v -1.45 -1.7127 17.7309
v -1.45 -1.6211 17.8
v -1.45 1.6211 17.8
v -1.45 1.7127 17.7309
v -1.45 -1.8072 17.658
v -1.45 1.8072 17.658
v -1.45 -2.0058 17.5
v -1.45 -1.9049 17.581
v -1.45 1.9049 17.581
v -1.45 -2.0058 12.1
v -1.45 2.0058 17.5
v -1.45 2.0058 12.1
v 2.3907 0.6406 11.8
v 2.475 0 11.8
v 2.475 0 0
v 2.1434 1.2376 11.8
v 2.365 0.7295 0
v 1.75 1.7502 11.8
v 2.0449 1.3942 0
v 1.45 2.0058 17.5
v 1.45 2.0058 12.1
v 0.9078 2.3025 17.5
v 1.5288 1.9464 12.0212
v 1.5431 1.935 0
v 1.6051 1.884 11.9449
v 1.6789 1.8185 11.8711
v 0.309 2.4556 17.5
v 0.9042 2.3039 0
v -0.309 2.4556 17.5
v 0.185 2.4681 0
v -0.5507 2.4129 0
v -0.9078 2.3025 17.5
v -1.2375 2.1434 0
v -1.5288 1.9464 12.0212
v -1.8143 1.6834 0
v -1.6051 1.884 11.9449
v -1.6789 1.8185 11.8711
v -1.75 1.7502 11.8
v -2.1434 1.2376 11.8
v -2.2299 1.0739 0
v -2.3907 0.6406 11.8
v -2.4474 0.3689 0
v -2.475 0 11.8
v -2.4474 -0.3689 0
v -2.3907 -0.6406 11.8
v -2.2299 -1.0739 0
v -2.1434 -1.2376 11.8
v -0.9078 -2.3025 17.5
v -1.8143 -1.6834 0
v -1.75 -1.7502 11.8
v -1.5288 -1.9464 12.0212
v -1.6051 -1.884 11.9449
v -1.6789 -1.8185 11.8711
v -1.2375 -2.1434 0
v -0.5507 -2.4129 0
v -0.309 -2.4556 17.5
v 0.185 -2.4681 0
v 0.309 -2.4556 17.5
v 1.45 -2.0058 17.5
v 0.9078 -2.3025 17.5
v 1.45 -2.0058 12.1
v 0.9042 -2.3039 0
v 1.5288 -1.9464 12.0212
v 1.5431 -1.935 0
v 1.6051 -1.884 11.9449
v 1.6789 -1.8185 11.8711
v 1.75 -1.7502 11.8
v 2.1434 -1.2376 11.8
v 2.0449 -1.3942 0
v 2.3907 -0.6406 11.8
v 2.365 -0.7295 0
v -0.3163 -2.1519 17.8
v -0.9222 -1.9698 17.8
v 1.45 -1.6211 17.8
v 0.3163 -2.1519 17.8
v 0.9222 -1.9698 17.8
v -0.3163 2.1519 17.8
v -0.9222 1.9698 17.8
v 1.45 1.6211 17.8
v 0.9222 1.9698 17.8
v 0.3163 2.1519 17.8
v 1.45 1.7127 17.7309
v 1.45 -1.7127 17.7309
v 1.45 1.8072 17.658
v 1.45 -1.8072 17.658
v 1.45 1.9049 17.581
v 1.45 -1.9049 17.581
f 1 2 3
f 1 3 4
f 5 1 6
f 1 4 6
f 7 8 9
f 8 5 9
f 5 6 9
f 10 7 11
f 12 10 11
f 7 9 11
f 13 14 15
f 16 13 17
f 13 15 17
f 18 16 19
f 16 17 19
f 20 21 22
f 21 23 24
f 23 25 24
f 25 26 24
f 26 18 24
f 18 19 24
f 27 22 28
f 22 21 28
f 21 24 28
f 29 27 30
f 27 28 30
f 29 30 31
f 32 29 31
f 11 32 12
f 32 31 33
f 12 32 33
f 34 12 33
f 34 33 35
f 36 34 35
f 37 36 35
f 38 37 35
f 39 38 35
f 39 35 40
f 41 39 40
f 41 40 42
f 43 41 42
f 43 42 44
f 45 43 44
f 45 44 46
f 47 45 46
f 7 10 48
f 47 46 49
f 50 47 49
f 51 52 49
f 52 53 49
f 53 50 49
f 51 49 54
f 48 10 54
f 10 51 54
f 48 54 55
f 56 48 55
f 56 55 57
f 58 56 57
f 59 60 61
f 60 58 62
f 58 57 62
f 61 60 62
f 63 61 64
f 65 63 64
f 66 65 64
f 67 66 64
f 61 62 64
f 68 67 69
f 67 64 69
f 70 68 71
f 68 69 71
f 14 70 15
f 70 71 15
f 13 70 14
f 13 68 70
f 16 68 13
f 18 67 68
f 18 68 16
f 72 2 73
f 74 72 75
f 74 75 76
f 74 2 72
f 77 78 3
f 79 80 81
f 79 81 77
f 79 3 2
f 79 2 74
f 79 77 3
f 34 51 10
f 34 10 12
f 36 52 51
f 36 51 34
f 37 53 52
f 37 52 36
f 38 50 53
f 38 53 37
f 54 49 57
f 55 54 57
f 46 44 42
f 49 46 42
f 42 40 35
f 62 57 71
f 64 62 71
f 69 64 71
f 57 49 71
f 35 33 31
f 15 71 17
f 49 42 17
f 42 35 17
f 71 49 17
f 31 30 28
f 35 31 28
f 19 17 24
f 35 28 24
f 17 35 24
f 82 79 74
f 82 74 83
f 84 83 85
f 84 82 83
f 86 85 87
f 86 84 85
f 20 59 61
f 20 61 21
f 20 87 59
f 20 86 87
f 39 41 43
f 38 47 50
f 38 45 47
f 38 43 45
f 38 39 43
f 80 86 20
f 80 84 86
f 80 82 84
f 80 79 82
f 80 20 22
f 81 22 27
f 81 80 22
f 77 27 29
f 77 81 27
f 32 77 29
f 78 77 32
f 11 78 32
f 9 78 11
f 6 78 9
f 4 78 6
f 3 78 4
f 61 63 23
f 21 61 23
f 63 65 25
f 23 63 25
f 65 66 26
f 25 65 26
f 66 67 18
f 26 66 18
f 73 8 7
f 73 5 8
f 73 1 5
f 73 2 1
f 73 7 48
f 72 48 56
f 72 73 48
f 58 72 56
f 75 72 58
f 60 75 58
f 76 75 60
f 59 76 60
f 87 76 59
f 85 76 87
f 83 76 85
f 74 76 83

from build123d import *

# Parameters (mm, degrees)
SKETCH1_R           = 2.475
EXTRUDE1_DEPTH      = 17.8
SKETCH2_OUTSIDE_W   = 10.776
SKETCH2_OUTSIDE_H   = 10.776
SKETCH2_OUTSIDE_W_2 = 2.9
SKETCH2_OUTSIDE_H_2 = 7
EXTRUDE2_DEPTH      = 6
CHAMFER1_SIZE       = 0.3
CHAMFER2_SIZE       = 0.3


with BuildPart() as part:
    # Sketch1 → Extrude1 (new body)
    with BuildSketch(Plane.XY):
        Circle(SKETCH1_R)
    extrude(amount=EXTRUDE1_DEPTH)

    # Sketch2 outside → Extrude2 (cut)
    with BuildSketch(Plane.XY.offset(17.8)):
        Rectangle(SKETCH2_OUTSIDE_W, SKETCH2_OUTSIDE_H)
        Rectangle(SKETCH2_OUTSIDE_W_2, SKETCH2_OUTSIDE_H_2, mode=Mode.SUBTRACT)
    extrude(amount=-EXTRUDE2_DEPTH, mode=Mode.SUBTRACT)

    # Chamfer1
    chamfer1_edges = [part.edges().sort_by_distance(p)[0] for p in [
        (0, 2.475, 17.8),
        (0, -2.475, 17.8),
    ]]
    chamfer(chamfer1_edges, length=CHAMFER1_SIZE)

    # Chamfer2
    chamfer2_edges = [part.edges().sort_by_distance(p)[0] for p in [
        (-1.45, 0, 11.8),
        (1.45, 0, 11.8),
    ]]
    chamfer(chamfer2_edges, length=CHAMFER2_SIZE)


solid = part.part
